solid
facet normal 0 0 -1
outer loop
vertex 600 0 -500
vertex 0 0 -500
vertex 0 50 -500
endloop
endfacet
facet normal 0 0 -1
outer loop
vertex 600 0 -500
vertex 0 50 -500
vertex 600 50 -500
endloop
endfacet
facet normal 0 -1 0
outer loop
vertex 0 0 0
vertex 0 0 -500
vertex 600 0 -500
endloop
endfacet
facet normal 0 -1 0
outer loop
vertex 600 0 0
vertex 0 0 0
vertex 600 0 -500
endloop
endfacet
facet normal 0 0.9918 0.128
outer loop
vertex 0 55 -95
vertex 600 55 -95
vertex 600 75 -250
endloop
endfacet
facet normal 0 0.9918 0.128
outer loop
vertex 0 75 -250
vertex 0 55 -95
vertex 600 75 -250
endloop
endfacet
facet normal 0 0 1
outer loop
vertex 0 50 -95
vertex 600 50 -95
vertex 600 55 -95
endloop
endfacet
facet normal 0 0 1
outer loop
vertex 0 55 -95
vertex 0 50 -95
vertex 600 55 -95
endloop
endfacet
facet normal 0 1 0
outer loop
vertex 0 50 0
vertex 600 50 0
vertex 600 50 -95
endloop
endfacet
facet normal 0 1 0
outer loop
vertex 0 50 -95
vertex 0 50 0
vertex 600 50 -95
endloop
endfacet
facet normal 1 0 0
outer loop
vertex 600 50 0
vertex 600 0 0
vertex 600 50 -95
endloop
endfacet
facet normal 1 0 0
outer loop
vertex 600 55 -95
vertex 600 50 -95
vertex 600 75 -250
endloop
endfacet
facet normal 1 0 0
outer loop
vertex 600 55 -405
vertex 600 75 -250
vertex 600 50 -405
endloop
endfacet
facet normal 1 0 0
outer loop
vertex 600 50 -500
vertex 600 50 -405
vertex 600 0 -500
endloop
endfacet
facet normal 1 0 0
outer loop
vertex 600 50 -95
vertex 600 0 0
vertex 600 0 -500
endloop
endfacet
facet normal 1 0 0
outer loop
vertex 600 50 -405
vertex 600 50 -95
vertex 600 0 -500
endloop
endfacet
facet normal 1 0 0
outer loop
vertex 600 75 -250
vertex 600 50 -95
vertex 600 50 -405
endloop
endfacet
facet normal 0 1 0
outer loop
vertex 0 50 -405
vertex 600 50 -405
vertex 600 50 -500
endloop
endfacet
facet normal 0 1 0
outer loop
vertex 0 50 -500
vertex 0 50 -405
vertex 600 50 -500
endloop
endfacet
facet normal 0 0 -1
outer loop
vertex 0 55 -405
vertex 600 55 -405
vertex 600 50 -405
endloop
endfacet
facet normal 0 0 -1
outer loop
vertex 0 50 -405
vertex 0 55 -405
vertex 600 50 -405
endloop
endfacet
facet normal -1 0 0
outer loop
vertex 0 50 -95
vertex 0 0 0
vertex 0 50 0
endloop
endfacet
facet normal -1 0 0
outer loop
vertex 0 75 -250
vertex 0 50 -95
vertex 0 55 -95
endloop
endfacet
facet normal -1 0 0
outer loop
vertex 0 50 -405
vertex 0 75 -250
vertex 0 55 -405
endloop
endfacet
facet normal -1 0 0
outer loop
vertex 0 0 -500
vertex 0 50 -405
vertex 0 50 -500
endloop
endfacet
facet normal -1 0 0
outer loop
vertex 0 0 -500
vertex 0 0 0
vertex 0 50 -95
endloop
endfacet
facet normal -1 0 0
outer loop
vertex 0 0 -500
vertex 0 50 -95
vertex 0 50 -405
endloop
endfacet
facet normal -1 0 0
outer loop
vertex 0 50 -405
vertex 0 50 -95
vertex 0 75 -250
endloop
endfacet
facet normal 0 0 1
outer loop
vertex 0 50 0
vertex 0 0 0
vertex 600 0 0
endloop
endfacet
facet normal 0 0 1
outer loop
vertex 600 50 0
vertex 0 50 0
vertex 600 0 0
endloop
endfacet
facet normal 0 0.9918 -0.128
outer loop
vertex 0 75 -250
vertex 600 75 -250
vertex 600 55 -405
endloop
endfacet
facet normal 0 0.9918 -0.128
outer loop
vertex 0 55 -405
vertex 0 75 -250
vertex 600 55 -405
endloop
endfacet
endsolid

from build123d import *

# Parameters (mm, degrees)
SKETCH_1_W          = 600
SKETCH_1_H          = 500
EXTRUDE_1_DEPTH     = 75
CUT_EXTRUDE_1_DEPTH = 785.617741324
CUT_EXTRUDE_2_DEPTH = 785.617741324


with BuildPart() as part:
    # 草图1 → 凸台-拉伸1 (new body)
    with BuildSketch(Plane(origin=(0, 0, 0), x_dir=(1, 0, 0), z_dir=(0, 1, 0))):
        with Locations((300, 250)):
            Rectangle(SKETCH_1_W, SKETCH_1_H)
    extrude(amount=EXTRUDE_1_DEPTH)

    # 草图3 → 切除-拉伸1 (cut, through all)
    with BuildSketch(Plane(origin=(600, 0, 0), x_dir=(0, 0, -1), z_dir=(1, 0, 0))):
        Polygon((405, 55), (405, 50), (500, 50), (500, 75), (250, 75), align=None)
    extrude(amount=-CUT_EXTRUDE_1_DEPTH, mode=Mode.SUBTRACT)

    # 草图4 → 切除-拉伸2 (cut, through all)
    with BuildSketch(Plane(origin=(600, 0, 0), x_dir=(0, 0, -1), z_dir=(1, 0, 0))):
        Polygon((0, 75), (0, 50), (95, 50), (95, 55), (250, 75), align=None)
    extrude(amount=-CUT_EXTRUDE_2_DEPTH, mode=Mode.SUBTRACT)


solid = part.part
